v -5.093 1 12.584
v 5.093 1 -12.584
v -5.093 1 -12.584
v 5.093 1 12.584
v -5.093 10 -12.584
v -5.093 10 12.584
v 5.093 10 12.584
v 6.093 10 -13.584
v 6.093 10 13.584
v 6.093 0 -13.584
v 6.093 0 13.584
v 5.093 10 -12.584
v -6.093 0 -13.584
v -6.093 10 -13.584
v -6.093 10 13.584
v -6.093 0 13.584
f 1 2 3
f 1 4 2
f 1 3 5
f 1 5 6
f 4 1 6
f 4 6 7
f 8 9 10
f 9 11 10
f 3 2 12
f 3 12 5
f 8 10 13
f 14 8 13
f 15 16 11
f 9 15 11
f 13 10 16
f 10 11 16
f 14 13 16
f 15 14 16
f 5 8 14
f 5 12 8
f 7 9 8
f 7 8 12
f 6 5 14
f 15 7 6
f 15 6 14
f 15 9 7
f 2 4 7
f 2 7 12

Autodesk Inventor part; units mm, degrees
ref_plane "YZ Plane" through (0, 0, 0) normal (1, 0, 0) x (0, 1, 0)
ref_plane "XZ Plane" through (0, 0, 0) normal (0, 1, 0) x (-1, 0, 0)
ref_plane "XY Plane" through (0, 0, 0) normal (0, 0, 1) x (1, 0, 0)
sketch "Sketch1" plane through (0, 0, 0) normal (0, 1, 0) x (-1, 0, 0)
  line L0 (6.0929, 13.5835) -> (-6.0929, 13.5835)
  line L1 (-6.0929, 13.5835) -> (-6.0929, -13.5835)
  line L2 (-6.0929, -13.5835) -> (6.0929, -13.5835)
  line L3 (6.0929, -13.5835) -> (6.0929, 13.5835)
  line L4 (6.0929, 13.5835) -> (-6.0929, -13.5835) construction
  line L5 (-6.0929, 13.5835) -> (6.0929, -13.5835) construction
  point P0 (0, 0)
extrude "Extrusion1" add sketch "Sketch1" along normal blind 10
shell "Shell1" thickness 1 removed faces 1 at (2.031, 10, -4.5278)
equation "\"BendRadius\" = Thickness"
equation "\"BendReliefWidth\" = Thickness"
equation "\"BendReliefDepth\" = 0.5 * Thickness"
equation "\"CornerReliefSize\" = 4 * Thickness"
equation "\"MinimumRemnant\" = 2 * Thickness"
equation "\"TransitionRadius\" = BendRadius"
equation "\"JacobiRadiusSize\" = BendRadius"
equation "\"GapSize\" = Thickness"
equation "\"Thickness\" = 1"
properties part number "Stress analysis" material "Aluminum 6061-AHC"
